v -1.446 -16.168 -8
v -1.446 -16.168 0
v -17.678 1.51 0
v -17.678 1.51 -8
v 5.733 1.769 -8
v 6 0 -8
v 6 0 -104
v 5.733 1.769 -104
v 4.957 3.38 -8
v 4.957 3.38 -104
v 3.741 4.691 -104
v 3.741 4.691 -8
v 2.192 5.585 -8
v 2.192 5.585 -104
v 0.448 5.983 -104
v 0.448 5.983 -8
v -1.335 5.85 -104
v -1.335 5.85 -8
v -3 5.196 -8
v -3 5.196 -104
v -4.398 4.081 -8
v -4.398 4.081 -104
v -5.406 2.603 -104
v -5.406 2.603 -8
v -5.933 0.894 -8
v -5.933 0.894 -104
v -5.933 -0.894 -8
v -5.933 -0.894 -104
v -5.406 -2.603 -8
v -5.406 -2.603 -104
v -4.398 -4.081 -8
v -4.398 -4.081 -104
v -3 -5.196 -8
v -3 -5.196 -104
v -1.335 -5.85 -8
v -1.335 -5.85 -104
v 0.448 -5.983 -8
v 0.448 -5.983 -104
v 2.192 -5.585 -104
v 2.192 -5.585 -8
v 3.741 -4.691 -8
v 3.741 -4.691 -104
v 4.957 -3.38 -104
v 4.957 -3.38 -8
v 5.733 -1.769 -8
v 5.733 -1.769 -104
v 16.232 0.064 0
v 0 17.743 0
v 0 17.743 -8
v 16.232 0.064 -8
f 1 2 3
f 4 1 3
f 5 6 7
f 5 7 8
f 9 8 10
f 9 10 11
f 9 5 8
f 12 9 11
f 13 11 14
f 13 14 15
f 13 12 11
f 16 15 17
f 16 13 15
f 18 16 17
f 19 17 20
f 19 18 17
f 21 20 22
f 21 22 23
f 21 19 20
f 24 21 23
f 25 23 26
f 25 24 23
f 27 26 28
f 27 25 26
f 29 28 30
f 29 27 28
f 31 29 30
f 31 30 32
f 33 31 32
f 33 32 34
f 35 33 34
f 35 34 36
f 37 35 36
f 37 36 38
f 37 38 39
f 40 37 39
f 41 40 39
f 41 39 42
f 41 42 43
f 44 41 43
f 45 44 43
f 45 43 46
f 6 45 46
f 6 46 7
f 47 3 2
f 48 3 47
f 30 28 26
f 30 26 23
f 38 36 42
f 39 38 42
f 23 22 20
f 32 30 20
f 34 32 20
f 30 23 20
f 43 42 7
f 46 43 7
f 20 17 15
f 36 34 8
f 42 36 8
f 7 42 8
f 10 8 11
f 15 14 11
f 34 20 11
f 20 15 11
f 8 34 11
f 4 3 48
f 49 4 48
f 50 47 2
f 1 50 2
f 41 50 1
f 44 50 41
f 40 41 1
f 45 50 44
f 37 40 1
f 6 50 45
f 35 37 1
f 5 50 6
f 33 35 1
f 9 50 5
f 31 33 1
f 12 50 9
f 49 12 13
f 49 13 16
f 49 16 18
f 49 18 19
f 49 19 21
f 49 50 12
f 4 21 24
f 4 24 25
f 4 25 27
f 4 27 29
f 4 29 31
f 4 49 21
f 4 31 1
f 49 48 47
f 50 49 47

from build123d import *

# Parameters (mm, degrees)
BOSS_EXTRUDE1_DEPTH = 8
SKETCH4_R           = 6
BOSS_EXTRUDE2_DEPTH = 104


with BuildPart() as part:
    # Sketch2 → Boss-Extrude1 (new body)
    with BuildSketch(Plane.XY):
        Polygon((-17.678131714, 1.510354203), (0, 17.742533943), (16.23217974, 0.064402229), (-1.445951974, -16.167777511), align=None)
    extrude(amount=-BOSS_EXTRUDE1_DEPTH)

    # Sketch4 → Boss-Extrude2 (add)
    with BuildSketch(Plane.XY):
        Circle(SKETCH4_R)
    extrude(amount=-BOSS_EXTRUDE2_DEPTH)


solid = part.part
